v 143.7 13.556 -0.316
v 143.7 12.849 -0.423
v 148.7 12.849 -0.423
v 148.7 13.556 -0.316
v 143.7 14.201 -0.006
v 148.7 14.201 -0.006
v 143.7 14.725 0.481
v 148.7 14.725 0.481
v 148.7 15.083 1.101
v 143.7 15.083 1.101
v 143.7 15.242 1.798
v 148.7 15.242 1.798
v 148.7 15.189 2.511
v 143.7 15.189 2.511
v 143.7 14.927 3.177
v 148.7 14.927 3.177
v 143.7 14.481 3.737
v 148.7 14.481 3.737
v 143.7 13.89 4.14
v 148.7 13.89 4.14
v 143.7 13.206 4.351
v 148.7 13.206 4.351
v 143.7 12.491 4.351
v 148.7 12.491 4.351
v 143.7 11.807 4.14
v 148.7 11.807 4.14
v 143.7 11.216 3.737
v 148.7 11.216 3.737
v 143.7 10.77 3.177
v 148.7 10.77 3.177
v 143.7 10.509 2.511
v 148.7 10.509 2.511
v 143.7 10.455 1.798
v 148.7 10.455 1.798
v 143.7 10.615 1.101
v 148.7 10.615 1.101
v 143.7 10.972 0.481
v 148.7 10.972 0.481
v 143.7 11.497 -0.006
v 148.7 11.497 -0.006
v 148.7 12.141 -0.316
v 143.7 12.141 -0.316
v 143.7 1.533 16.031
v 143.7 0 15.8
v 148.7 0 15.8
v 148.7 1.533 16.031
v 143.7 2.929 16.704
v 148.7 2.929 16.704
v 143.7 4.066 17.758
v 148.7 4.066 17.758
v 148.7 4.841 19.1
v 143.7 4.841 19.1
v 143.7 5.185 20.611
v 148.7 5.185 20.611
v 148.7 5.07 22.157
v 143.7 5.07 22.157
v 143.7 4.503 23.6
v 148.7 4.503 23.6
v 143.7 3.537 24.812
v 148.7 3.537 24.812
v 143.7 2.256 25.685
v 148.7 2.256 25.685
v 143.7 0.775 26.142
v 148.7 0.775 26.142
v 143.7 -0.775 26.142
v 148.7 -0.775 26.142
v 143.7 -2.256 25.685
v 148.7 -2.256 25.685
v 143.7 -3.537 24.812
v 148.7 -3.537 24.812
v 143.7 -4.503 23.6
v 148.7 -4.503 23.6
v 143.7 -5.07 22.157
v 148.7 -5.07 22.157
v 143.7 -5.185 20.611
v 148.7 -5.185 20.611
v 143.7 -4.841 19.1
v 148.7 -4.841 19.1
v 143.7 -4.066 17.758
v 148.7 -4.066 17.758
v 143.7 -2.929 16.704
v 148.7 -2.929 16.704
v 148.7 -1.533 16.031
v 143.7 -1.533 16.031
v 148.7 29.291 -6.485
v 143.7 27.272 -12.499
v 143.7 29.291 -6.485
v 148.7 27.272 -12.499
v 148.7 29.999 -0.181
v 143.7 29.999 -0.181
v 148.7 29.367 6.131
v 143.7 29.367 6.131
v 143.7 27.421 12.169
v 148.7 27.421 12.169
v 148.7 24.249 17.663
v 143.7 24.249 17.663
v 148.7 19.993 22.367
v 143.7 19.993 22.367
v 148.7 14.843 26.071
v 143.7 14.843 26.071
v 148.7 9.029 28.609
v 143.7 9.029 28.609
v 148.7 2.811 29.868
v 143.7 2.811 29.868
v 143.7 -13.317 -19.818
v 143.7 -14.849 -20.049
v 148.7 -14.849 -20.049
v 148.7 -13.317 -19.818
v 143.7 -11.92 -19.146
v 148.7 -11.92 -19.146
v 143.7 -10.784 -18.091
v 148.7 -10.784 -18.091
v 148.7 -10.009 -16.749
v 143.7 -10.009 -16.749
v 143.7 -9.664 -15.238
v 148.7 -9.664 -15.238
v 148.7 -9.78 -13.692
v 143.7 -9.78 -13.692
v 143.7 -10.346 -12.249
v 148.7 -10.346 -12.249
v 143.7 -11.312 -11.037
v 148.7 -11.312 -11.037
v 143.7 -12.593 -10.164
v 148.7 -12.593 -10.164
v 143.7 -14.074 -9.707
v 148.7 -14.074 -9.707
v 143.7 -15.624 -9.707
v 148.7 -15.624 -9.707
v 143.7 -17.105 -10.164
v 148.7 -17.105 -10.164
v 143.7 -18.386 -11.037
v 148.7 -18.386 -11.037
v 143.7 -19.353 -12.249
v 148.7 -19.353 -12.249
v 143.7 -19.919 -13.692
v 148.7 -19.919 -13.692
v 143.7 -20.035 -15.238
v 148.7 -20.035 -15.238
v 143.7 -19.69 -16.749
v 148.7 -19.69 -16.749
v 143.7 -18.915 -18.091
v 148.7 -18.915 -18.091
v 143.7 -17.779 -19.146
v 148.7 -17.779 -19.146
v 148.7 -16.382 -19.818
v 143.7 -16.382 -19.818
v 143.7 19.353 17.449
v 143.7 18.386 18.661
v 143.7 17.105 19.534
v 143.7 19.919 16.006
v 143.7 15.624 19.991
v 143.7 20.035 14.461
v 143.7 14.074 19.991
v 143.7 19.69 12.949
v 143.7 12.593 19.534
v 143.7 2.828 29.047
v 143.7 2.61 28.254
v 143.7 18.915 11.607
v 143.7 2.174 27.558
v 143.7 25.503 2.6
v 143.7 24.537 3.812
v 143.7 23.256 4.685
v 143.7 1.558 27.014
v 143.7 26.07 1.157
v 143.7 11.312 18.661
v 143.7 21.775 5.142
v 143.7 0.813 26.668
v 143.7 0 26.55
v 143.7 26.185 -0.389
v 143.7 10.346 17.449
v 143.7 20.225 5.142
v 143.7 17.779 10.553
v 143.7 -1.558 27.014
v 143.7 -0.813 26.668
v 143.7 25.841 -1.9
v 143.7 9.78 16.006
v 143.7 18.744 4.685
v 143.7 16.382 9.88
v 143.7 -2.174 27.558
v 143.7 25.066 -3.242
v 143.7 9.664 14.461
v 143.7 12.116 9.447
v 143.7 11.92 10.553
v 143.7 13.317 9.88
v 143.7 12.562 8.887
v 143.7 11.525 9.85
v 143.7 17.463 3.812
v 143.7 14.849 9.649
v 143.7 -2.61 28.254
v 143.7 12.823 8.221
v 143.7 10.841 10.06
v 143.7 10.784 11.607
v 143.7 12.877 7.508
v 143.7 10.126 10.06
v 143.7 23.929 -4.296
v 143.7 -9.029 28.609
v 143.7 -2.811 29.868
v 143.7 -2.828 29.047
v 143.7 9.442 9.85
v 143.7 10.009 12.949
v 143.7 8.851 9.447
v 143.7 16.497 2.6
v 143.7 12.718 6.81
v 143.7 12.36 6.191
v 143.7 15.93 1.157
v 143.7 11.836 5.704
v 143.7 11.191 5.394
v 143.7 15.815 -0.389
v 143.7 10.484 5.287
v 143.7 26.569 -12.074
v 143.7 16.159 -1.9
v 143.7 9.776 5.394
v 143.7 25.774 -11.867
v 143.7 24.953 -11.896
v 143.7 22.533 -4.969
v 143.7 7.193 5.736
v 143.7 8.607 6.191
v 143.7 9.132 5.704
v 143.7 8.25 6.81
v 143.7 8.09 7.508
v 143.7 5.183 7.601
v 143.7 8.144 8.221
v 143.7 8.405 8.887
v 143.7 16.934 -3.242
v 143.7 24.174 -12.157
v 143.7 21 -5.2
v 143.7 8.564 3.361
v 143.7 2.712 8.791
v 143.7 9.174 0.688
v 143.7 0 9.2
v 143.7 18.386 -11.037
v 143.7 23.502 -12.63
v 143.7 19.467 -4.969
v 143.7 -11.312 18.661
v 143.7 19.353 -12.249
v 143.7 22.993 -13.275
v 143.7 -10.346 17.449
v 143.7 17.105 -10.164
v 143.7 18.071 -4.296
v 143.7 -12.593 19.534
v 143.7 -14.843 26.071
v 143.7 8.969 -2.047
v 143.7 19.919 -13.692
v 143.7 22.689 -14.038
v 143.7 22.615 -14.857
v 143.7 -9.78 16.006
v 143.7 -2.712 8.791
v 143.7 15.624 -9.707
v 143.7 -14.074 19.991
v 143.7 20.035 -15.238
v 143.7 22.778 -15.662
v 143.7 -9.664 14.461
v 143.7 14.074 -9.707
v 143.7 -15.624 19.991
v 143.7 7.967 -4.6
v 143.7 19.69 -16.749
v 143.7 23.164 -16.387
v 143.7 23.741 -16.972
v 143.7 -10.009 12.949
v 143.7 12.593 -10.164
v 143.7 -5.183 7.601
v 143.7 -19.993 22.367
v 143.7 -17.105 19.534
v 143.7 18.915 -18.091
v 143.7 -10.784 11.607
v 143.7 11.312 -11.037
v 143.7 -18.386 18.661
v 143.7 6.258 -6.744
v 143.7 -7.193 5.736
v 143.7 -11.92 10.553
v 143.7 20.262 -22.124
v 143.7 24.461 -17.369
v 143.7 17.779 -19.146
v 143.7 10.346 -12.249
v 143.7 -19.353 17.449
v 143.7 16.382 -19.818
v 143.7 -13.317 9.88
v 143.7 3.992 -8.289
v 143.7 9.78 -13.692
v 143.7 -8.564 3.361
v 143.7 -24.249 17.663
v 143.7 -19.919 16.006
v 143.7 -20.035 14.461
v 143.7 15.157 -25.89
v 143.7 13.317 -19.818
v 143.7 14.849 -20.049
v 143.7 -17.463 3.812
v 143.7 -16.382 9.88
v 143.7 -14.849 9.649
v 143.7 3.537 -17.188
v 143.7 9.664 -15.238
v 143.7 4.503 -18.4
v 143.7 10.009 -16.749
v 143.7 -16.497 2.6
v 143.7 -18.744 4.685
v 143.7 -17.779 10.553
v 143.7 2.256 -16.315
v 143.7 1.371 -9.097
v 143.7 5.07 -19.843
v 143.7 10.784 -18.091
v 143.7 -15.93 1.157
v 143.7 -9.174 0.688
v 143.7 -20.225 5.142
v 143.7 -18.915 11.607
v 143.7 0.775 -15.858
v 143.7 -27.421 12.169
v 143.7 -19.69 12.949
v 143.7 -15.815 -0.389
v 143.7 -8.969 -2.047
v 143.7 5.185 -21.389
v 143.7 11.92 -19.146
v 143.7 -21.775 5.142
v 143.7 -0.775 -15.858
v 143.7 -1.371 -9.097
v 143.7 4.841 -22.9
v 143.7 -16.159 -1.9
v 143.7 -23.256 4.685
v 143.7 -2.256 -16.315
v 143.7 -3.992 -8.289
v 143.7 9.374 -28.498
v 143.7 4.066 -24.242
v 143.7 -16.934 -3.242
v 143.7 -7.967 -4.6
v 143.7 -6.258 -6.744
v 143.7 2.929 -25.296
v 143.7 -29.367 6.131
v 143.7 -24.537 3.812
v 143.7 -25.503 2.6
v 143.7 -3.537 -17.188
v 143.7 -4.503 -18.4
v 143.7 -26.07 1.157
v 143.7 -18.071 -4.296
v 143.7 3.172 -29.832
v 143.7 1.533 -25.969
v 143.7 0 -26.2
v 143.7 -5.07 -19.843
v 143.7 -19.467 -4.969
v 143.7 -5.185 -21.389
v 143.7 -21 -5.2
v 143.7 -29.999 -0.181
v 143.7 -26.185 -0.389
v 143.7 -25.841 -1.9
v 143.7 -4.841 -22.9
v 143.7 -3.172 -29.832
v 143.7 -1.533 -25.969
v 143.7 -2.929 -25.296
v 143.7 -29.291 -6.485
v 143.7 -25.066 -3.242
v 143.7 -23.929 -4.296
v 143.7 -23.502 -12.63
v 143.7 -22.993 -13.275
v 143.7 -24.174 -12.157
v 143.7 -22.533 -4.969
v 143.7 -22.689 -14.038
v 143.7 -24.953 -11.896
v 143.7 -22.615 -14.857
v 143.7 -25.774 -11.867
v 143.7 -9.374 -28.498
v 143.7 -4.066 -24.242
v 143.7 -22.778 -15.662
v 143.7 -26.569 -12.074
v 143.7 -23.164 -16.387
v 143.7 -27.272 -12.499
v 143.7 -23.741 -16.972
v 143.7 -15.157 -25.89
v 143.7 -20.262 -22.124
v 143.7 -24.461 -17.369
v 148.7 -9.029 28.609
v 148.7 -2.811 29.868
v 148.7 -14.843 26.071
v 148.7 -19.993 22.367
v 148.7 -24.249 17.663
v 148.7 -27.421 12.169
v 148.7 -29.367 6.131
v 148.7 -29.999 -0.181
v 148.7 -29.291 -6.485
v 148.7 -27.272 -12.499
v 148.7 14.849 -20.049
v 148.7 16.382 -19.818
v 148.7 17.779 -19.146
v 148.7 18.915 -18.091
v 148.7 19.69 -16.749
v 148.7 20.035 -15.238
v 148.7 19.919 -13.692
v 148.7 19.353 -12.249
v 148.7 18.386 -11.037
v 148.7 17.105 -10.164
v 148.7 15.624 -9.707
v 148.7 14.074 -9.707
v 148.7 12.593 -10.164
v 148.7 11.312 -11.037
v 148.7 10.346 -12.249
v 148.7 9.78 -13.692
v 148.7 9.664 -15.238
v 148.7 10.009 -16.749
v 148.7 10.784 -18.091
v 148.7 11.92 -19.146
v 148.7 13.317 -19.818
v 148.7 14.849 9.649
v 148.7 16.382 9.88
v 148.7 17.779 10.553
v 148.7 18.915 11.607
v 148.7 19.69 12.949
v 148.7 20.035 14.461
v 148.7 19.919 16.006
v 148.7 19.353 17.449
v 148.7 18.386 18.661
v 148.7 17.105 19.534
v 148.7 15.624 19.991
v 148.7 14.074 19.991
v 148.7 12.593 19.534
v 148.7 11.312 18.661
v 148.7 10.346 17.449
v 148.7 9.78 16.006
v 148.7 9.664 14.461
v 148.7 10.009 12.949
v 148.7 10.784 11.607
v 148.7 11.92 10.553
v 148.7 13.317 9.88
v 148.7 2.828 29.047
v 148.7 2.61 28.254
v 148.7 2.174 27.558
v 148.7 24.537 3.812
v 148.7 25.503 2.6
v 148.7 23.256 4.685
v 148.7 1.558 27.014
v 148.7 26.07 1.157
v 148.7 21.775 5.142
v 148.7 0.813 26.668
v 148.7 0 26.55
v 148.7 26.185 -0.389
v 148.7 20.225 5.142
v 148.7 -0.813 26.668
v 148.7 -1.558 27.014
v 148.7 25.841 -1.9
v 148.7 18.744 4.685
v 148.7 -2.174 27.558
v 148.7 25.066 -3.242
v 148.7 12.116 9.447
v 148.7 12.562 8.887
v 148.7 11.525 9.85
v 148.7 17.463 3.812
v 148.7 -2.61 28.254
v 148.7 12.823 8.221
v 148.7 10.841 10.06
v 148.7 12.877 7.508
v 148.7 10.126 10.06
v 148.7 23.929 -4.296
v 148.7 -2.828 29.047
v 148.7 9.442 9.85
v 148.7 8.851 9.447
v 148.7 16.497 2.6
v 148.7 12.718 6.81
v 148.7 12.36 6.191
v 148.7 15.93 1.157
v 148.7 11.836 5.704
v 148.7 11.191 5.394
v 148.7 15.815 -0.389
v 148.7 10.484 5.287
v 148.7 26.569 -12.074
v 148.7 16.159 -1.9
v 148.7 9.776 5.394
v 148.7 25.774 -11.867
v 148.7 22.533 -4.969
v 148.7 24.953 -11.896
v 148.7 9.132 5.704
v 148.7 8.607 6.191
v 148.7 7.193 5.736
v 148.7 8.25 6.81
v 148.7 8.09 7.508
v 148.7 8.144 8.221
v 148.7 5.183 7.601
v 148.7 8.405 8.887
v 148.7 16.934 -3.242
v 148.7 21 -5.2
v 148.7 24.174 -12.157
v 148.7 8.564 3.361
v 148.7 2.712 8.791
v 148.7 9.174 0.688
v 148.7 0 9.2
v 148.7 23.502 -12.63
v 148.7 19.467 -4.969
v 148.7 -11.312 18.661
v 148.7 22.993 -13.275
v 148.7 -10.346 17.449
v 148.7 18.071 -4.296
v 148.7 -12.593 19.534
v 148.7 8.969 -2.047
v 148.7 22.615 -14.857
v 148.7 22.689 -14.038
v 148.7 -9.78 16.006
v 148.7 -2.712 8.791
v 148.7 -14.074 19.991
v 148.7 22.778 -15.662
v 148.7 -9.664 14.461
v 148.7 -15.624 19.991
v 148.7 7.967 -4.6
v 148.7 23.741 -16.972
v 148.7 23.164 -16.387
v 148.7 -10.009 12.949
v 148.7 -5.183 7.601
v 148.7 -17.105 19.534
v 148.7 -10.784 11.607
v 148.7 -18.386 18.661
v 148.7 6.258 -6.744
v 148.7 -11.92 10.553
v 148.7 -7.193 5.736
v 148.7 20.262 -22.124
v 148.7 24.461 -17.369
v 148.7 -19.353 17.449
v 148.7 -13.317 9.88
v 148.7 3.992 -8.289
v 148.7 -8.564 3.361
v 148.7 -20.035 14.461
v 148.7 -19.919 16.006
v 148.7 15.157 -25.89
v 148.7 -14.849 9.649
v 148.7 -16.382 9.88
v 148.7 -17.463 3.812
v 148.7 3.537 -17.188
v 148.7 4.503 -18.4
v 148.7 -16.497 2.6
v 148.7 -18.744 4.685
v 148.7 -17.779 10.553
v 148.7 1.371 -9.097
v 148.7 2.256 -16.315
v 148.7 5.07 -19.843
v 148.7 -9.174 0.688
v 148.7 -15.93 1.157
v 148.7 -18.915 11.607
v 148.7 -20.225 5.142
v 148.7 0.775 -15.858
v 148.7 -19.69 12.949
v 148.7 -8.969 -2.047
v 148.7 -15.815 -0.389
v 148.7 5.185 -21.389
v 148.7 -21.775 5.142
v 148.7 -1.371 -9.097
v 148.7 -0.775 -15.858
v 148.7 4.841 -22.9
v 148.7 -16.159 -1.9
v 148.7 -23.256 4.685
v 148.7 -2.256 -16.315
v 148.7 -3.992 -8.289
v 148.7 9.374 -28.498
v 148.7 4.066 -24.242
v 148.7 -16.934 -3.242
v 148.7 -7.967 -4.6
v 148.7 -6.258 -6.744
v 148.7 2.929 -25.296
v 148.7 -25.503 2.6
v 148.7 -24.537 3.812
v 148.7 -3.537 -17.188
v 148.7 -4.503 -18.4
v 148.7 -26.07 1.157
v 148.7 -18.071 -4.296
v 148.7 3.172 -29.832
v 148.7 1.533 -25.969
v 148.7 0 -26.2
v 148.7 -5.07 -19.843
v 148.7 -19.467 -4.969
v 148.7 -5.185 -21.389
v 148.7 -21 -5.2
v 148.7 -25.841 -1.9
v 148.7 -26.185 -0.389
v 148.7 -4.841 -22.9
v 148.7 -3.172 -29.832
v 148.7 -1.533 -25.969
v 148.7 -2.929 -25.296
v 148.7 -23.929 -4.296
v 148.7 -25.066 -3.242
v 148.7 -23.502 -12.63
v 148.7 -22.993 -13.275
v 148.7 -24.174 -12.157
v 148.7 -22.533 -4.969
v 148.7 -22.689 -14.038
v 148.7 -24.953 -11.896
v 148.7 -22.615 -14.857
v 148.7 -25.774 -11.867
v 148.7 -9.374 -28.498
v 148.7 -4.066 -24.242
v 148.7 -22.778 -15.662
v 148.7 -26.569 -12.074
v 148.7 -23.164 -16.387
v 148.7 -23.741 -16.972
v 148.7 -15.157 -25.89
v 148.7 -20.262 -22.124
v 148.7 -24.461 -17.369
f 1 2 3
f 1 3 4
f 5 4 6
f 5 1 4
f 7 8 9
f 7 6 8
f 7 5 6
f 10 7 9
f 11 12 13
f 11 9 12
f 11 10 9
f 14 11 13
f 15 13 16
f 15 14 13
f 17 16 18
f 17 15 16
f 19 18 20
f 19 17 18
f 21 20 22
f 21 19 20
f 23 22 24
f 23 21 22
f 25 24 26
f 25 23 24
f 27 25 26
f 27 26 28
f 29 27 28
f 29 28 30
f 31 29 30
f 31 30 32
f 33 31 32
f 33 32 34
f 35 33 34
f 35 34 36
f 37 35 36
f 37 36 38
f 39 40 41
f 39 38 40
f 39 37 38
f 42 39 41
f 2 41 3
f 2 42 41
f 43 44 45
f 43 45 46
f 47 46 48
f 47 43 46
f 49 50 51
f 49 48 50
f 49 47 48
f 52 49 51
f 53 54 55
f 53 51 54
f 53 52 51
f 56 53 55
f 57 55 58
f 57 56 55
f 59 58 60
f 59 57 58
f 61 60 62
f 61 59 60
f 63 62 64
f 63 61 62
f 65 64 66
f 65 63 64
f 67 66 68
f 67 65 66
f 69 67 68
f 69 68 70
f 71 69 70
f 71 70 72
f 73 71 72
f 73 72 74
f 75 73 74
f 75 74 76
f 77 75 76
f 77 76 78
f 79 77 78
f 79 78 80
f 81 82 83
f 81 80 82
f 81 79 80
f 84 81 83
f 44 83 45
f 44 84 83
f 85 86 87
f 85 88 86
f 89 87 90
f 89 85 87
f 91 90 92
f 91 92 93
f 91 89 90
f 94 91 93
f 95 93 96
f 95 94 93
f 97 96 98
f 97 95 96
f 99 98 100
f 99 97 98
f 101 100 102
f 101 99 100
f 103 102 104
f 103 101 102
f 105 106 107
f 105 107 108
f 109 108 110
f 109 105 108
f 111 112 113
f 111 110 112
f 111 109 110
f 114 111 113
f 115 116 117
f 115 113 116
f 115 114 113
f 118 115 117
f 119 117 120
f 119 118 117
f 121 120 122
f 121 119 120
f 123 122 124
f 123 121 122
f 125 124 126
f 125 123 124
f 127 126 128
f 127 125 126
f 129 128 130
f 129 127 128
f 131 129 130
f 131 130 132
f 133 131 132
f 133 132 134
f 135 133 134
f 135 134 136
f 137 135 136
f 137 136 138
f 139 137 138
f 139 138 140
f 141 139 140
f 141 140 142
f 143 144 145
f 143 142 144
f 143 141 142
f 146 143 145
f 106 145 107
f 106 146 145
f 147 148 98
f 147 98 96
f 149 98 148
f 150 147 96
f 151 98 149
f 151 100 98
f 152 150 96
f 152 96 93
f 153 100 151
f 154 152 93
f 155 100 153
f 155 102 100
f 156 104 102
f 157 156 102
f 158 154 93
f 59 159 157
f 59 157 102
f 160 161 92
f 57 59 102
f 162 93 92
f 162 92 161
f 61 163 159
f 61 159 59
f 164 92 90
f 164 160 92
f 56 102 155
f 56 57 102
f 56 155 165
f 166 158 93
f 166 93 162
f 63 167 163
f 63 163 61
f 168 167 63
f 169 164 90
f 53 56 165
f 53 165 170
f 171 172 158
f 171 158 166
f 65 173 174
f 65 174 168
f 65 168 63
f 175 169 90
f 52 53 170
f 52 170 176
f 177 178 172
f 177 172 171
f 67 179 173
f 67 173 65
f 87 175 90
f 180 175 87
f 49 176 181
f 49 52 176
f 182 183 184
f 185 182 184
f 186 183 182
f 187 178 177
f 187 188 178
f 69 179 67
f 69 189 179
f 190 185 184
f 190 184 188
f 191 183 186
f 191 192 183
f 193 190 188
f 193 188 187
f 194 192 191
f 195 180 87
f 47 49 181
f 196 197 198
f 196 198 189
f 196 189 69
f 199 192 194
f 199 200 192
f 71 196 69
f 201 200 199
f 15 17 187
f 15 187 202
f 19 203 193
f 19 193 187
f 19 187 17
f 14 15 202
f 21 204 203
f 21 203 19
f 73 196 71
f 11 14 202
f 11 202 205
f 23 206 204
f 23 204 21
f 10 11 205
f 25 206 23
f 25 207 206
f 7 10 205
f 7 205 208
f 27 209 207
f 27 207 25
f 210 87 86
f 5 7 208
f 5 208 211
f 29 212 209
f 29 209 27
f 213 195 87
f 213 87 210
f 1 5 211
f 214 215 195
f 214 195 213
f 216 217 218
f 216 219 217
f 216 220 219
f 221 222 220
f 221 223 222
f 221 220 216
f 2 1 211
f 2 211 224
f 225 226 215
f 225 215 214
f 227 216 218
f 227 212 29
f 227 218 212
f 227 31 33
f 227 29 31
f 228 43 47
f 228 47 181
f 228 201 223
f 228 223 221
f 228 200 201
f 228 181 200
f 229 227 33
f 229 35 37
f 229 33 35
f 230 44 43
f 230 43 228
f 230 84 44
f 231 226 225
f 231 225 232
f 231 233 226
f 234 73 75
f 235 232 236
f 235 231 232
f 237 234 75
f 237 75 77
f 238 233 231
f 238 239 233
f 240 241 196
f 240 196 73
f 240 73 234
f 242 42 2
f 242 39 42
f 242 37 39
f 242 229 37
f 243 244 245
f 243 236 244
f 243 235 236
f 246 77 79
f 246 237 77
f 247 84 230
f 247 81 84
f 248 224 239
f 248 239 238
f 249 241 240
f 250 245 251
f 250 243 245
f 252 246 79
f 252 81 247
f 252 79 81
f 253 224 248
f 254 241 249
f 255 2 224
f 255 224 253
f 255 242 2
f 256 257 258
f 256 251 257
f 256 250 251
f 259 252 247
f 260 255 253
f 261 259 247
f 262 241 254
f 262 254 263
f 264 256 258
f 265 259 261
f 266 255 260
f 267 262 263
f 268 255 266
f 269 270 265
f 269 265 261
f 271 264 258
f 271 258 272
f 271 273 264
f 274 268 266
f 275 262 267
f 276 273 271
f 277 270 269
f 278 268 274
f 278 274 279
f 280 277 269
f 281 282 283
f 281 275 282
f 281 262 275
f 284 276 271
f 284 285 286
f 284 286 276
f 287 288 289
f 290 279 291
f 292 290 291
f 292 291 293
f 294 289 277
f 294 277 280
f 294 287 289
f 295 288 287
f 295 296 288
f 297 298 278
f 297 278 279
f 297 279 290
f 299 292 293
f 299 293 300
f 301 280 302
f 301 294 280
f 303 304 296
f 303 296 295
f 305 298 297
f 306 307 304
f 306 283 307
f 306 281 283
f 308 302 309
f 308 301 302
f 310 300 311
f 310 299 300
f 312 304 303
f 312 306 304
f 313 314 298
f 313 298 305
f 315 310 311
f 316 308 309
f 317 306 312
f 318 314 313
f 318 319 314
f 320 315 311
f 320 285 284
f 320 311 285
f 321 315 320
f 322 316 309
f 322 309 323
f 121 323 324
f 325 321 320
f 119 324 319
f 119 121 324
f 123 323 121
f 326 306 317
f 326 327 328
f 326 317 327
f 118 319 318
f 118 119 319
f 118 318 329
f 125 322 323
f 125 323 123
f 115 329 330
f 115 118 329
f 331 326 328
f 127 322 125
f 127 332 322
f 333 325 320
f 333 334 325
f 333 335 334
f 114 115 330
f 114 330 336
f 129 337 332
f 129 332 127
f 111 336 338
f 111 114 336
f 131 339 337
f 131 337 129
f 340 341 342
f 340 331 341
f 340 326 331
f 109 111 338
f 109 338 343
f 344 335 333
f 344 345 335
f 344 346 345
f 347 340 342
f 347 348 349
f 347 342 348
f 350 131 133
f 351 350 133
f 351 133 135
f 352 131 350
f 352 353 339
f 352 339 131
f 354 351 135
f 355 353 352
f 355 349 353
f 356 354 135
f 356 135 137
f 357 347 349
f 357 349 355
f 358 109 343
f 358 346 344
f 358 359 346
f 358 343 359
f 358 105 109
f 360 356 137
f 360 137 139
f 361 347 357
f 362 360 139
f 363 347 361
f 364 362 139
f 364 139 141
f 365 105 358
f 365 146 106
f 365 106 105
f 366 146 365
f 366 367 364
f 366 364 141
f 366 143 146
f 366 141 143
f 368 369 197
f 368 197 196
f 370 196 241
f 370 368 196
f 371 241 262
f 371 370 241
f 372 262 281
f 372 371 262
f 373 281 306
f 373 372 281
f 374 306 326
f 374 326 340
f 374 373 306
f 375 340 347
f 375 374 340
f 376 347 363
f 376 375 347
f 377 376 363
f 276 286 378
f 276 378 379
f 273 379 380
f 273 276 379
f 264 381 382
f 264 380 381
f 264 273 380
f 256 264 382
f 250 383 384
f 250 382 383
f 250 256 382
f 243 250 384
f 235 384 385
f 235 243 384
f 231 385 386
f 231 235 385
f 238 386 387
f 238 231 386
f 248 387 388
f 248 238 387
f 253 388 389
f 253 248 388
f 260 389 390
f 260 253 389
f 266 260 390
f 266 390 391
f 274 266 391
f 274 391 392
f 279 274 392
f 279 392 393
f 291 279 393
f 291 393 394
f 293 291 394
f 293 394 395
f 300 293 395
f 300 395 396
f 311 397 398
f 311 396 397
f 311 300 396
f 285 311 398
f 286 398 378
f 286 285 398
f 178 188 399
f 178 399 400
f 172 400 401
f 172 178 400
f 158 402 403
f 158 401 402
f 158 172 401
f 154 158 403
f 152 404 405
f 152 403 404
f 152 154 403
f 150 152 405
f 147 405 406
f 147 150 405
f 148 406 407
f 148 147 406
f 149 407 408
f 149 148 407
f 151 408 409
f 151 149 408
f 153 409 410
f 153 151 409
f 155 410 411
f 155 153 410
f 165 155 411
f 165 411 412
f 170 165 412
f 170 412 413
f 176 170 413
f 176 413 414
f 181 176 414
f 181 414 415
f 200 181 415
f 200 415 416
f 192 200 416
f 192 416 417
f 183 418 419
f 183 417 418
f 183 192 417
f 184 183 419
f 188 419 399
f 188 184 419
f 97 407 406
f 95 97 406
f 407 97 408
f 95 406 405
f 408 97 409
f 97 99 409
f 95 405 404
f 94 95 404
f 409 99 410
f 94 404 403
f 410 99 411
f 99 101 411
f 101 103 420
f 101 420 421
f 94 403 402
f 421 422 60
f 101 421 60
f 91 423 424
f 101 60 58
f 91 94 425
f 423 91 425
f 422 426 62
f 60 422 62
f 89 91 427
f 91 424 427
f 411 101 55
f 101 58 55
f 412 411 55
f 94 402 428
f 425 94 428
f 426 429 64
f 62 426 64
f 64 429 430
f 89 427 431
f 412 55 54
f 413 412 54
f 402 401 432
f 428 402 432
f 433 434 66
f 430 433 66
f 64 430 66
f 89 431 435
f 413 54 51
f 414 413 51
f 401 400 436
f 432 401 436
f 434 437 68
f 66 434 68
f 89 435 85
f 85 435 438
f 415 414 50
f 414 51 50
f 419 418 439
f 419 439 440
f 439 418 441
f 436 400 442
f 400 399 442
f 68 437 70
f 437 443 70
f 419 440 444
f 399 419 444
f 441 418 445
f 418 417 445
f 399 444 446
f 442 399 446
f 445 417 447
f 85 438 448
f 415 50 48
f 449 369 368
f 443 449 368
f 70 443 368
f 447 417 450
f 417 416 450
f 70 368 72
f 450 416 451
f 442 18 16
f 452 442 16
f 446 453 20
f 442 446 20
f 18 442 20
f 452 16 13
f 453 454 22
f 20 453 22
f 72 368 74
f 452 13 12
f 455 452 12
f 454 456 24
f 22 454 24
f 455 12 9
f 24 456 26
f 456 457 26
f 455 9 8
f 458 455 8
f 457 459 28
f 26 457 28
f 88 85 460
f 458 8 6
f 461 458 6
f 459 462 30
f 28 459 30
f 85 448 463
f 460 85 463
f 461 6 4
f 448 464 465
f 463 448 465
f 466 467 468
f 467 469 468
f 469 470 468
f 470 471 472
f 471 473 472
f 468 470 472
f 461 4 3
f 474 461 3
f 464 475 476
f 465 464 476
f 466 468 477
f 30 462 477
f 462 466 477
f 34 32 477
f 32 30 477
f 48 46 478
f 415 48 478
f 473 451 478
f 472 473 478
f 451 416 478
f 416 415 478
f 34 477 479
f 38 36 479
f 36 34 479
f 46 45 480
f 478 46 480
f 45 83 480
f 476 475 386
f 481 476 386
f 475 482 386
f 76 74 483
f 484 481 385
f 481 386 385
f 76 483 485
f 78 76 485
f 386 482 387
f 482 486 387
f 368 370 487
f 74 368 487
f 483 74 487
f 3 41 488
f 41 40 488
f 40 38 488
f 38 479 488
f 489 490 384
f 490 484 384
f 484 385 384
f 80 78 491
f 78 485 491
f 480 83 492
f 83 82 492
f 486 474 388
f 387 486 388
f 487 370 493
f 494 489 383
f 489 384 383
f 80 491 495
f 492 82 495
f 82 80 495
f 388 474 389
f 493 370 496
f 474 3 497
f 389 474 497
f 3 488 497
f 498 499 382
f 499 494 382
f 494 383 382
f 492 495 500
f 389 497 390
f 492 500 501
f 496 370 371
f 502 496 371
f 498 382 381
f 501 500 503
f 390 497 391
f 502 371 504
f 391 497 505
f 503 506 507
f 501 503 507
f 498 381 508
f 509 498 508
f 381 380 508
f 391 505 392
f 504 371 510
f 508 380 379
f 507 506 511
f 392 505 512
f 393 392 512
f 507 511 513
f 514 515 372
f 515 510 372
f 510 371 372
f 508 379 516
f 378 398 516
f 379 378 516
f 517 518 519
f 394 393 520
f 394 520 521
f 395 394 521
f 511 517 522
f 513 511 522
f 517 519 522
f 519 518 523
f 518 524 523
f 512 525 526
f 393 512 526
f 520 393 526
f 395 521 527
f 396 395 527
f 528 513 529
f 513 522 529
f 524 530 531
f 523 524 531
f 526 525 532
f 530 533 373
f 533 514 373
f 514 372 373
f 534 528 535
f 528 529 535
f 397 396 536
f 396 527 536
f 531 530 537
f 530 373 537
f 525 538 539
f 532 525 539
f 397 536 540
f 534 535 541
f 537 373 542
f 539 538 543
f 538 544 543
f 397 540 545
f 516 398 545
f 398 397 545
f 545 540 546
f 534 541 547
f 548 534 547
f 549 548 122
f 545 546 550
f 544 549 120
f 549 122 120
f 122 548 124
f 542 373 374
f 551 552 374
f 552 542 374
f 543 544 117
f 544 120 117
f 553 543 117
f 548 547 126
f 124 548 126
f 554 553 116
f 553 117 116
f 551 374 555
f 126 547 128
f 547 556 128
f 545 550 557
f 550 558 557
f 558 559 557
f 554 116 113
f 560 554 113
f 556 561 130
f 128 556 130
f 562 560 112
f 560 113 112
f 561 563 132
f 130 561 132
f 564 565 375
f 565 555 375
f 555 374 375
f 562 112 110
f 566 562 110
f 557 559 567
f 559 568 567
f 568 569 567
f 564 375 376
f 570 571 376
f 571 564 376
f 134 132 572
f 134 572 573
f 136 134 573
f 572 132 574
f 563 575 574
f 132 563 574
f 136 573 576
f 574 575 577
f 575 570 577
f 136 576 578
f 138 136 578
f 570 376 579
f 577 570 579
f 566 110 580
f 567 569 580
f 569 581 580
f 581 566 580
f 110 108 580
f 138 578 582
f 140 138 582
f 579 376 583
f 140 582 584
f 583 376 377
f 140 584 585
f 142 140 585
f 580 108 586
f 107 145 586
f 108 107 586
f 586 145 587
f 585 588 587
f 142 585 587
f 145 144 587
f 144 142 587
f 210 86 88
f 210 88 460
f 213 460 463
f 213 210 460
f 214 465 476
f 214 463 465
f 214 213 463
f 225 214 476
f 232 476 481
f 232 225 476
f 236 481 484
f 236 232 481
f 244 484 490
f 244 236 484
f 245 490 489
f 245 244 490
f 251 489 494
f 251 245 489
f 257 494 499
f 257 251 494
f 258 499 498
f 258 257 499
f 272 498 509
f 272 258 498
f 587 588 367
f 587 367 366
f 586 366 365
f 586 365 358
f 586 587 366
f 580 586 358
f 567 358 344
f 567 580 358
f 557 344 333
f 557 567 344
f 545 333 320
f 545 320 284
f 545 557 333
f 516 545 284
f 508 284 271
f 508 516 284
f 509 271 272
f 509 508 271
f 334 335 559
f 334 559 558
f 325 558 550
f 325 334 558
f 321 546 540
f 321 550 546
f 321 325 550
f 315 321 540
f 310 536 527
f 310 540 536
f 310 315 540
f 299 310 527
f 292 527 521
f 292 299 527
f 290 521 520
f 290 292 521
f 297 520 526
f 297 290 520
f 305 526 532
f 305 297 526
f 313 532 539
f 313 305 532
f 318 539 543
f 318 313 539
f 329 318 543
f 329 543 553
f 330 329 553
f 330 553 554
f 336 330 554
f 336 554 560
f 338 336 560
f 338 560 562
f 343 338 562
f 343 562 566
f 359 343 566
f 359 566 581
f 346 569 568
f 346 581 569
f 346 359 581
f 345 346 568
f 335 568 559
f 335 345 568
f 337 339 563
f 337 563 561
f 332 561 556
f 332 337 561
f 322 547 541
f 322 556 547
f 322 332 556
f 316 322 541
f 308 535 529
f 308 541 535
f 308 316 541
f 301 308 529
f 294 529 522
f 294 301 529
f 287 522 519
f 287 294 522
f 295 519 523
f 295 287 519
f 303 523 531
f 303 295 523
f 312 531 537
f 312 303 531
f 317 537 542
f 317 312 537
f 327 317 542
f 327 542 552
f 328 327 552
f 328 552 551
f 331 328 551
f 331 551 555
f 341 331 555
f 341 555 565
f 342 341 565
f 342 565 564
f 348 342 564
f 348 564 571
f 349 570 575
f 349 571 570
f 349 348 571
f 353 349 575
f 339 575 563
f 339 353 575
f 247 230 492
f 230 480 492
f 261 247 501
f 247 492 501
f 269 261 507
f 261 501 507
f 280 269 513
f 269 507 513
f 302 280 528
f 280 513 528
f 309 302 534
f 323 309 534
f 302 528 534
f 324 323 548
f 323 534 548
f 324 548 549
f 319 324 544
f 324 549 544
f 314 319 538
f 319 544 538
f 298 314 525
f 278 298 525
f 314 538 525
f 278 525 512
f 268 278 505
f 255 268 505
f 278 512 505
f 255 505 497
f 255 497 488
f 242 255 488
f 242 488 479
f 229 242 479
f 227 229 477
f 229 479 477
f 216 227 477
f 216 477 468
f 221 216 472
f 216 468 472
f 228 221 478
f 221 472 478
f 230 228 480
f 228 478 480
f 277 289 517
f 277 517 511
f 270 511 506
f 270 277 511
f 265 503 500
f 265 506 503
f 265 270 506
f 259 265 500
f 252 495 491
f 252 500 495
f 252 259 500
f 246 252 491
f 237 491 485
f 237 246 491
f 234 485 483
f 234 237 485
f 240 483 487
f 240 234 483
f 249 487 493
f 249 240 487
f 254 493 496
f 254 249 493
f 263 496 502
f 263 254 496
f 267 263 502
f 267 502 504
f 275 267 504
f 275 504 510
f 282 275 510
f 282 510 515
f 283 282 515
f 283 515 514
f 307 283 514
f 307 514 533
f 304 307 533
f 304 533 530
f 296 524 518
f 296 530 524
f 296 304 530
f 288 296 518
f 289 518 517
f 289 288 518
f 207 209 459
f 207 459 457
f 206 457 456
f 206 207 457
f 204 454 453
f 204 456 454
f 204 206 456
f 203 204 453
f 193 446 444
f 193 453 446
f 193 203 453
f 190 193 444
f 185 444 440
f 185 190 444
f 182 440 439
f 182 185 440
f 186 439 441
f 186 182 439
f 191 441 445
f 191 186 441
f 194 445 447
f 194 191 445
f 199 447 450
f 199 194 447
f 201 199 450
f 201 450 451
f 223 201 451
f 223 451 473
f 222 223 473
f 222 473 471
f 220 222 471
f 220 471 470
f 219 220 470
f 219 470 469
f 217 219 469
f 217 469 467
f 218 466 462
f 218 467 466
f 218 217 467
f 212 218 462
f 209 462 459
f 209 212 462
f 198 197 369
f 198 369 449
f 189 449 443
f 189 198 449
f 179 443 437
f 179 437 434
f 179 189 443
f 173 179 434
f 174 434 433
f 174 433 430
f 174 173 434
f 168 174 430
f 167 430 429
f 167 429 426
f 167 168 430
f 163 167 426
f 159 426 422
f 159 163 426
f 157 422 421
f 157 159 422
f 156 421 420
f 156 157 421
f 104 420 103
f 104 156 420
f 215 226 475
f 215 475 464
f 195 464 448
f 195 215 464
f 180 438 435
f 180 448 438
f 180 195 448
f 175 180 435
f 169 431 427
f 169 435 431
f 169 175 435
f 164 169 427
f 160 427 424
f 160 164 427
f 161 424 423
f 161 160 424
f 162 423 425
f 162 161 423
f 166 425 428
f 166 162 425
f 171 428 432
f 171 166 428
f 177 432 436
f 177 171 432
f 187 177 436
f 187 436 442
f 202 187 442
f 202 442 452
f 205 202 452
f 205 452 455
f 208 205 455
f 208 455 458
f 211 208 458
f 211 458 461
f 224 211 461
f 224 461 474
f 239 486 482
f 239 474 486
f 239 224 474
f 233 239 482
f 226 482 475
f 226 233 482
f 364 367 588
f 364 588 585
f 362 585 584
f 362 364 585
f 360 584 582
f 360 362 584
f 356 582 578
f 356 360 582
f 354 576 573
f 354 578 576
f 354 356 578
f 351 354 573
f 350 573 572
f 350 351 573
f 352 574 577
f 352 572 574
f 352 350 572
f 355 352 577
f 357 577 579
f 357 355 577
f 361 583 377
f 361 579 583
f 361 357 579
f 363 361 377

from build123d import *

# Parameters (mm, degrees)
AXIAL_PROFILE_MM_W     = 5
AXIAL_PROFILE_MM_H     = 20.8
AXIAL_HOLES_DEPTH      = 155.634051877
AXIAL_HOLES_DEPTH_BACK = 155.634051877
SKETCH2_R              = 5.2
SKETCH2_R_2            = 2.4
SKETCH2_R_3            = 2.85


with BuildPart() as part:
    # Axial profile (mm) → Full revolution (revolve)
    with BuildSketch(Plane.XY, mode=Mode.PRIVATE) as full_revolution_sk:
        with Locations((146.2, 19.6)):
            Rectangle(AXIAL_PROFILE_MM_W, AXIAL_PROFILE_MM_H)
    revolve(full_revolution_sk.sketch.rotate(Axis((-110, 0, 0), (1, 0, 0)), 90), axis=Axis((-110, 0, 0), (1, 0, 0)))

    # Sketch2 → Axial holes (cut, two sides: drawn at the far end of the back side and taken through both)
    with BuildSketch(Plane(origin=(0, 0, 0), x_dir=(0, 0, -1), z_dir=(1, 0, 0)).offset(-AXIAL_HOLES_DEPTH_BACK)):
        with Locations((0, 21)):
            Circle(SKETCH2_R)
        with Locations((-14.849242405, 14.849242405)):
            Circle(SKETCH2_R)
        with Locations((-21, 0)):
            Circle(SKETCH2_R)
        with Locations((-14.849242405, -14.849242405)):
            Circle(SKETCH2_R)
        with Locations((0, -21)):
            Circle(SKETCH2_R)
        with Locations((14.849242405, -14.849242405)):
            Circle(SKETCH2_R)
        with Locations((21, 0)):
            Circle(SKETCH2_R)
        with Locations((14.849242405, 14.849242405)):
            Circle(SKETCH2_R)
        with Locations((-1.977382665, 12.848733704)):
            Circle(SKETCH2_R_2)
        with Locations((-7.687206041, 10.483647423)):
            Circle(SKETCH2_R_2)
        with Locations((-29.4, 0)):
            Circle(SKETCH2_R_3)
        with Locations((14.7, -25.461146871)):
            Circle(SKETCH2_R_3)
        with Locations((14.7, 25.461146871)):
            Circle(SKETCH2_R_3)
    extrude(amount=AXIAL_HOLES_DEPTH + AXIAL_HOLES_DEPTH_BACK, mode=Mode.SUBTRACT)


solid = part.part
